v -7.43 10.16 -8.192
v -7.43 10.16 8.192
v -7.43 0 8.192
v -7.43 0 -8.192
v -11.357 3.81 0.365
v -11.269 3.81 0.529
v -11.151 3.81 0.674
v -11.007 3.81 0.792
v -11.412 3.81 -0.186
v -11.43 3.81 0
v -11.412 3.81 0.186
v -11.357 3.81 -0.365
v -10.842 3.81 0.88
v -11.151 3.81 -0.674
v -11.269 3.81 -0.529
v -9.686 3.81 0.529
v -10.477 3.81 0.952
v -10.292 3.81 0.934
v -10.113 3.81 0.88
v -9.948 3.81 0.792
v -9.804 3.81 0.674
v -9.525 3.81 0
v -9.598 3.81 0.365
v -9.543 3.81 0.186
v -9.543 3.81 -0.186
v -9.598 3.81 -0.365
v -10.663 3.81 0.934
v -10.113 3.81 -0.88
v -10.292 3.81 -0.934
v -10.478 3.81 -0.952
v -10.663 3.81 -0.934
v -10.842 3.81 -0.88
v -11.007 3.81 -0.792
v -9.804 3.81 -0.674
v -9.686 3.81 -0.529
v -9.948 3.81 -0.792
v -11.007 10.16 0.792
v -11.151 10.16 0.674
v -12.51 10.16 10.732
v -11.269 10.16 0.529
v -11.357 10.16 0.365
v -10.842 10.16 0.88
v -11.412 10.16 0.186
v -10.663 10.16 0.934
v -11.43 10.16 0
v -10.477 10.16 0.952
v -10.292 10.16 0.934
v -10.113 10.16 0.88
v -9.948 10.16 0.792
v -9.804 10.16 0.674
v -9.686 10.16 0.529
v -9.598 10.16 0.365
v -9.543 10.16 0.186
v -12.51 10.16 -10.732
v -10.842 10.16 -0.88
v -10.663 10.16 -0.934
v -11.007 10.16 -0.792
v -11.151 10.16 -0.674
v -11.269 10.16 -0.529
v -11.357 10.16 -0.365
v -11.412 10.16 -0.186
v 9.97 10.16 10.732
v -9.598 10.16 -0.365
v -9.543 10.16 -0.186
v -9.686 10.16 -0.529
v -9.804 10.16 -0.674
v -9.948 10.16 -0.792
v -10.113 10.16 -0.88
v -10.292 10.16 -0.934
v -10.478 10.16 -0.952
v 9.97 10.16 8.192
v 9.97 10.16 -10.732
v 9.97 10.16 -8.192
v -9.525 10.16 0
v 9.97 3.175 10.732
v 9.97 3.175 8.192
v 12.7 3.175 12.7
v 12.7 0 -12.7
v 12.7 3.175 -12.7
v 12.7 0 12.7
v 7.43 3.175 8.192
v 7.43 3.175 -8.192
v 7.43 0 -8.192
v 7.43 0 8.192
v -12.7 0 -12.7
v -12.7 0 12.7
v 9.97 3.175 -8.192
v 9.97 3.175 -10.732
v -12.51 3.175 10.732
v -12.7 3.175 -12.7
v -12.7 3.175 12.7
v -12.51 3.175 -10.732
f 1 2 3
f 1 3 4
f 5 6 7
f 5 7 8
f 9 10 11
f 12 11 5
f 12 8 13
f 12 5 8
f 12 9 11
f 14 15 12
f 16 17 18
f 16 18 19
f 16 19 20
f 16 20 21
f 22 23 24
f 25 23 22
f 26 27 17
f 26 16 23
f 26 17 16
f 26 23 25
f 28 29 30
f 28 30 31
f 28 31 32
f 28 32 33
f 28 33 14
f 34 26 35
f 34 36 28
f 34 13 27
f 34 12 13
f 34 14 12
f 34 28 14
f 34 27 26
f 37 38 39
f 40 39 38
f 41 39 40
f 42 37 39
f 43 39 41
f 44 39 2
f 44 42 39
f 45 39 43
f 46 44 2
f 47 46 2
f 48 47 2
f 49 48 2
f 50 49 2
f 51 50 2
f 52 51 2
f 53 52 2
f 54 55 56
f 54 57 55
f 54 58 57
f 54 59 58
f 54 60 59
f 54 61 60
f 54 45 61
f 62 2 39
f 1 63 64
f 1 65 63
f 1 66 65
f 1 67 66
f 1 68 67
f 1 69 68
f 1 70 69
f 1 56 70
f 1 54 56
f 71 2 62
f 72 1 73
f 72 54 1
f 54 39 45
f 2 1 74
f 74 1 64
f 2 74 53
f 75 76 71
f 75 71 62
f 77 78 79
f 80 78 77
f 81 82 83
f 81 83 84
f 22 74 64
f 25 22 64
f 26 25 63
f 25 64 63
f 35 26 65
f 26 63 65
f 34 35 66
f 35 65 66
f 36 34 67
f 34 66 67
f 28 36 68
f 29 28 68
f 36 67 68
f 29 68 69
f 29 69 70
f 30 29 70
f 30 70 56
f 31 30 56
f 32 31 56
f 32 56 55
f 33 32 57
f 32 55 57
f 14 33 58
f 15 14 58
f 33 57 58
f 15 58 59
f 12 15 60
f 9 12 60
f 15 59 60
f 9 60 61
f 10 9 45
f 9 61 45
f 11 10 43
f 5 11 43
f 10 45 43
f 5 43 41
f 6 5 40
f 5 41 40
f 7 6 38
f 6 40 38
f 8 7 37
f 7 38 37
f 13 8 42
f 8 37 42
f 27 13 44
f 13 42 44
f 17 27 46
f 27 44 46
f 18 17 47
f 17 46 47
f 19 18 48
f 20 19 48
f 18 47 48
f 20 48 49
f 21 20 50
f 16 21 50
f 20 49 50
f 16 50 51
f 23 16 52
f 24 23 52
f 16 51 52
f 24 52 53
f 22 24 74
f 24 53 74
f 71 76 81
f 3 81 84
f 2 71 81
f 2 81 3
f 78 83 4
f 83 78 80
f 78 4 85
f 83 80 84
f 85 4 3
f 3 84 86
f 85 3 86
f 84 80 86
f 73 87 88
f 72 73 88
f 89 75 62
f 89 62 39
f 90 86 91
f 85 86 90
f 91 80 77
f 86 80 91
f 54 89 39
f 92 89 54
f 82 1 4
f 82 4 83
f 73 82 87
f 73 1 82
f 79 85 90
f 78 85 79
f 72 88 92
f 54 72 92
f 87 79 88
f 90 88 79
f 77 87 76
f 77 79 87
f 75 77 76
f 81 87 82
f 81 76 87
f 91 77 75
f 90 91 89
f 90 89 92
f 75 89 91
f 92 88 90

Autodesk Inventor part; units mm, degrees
ref_plane "YZ Plane" through (0, 0, 0) normal (1, 0, 0) x (0, 1, 0)
ref_plane "XZ Plane" through (0, 0, 0) normal (0, 1, 0) x (-1, 0, 0)
ref_plane "XY Plane" through (0, 0, 0) normal (0, 0, 1) x (1, 0, 0)
sketch "Sketch1" plane through (0, 0, 0) normal (0, 1, 0) x (-1, 0, 0)
  line L0 (-12.7, 12.7) -> (12.7, 12.7)
  line L1 (12.7, 12.7) -> (12.7, -12.7)
  line L2 (12.7, -12.7) -> (-12.7, -12.7)
  line L3 (-12.7, -12.7) -> (-12.7, 12.7)
  line L4 (-12.7, 12.7) -> (12.7, -12.7) construction
  line L5 (12.7, 12.7) -> (-12.7, -12.7) construction
  point P0 (0, 0)
  dimension "d0" = 25.4
  dimension "d1" = 25.4
extrude "Extrusion1" add sketch "Sketch1" along normal blind 3.175
sketch "Sketch2" plane through (0, 3.175, 0) normal (0, 1, 0) x (1, 0, 0)
  line L0 (7.4295, -8.1915) -> (-7.4295, -8.1915)
  line L1 (-7.4295, -8.1915) -> (-7.4295, 8.1915)
  line L2 (-7.4295, 8.1915) -> (7.4295, 8.1915)
  line L3 (7.4295, 8.1915) -> (7.4295, -8.1915)
  line L4 (7.4295, -8.1915) -> (-7.4295, 8.1915) construction
  line L5 (-7.4295, -8.1915) -> (7.4295, 8.1915) construction
  point P0 (0, 0)
  dimension "d4" = 14.859
  dimension "d5" = 16.383
extrude "Extrusion2" cut sketch "Sketch2" against normal through all
sketch "Sketch3" plane through (0, 3.175, 0) normal (0, 1, 0) x (1, 0, 0)
  line L0 (-7.4295, -8.1915) -> (-7.4295, 8.1915) projected
  line L1 (-7.4295, -8.1915) -> (-12.5095, -8.1915)
  line L2 (-12.5095, -8.1915) -> (-12.5095, 8.1915)
  line L3 (-12.5095, 8.1915) -> (-7.4295, 8.1915)
  line L4 (-7.4295, 8.1915) -> (-7.4295, -8.1915)
  line L5 (-12.5095, -8.1915) -> (9.9695, -8.1915)
  line L6 (9.9695, -8.1915) -> (9.9695, -10.7315)
  line L7 (9.9695, -10.7315) -> (-12.5095, -10.7315)
  line L8 (-12.5095, -10.7315) -> (-12.5095, -8.1915)
  line L9 (7.4295, 8.1915) -> (7.4295, -8.1915) projected
  line L10 (-12.5095, 8.1915) -> (9.9695, 8.1915)
  line L11 (9.9695, 8.1915) -> (9.9695, 10.7315)
  line L12 (9.9695, 10.7315) -> (-12.5095, 10.7315)
  line L13 (-12.5095, 10.7315) -> (-12.5095, 8.1915)
  point P0 (0, 0)
  point P1 (-9.9695, 8.1915)
  point P2 (9.9695, -9.4615)
  point P3 (9.9695, 9.4615)
  dimension "d11" = 2.54
  dimension "d12" = 2.54
  dimension "d13" = 2.54
  dimension "d14" = 5.08
extrude "Extrusion3" add sketch "Sketch3" along normal blind 6.985 contours L1 L2 L3 L0 | L5 L6 L7 L8 L1 | L3 L13 L12 L11 L10
sketch "Sketch4" plane through (0, 10.16, 0) normal (0, 1, 0) x (1, 0, 0)
  line L0 (-7.4295, -8.1915) -> (-7.4295, 8.1915) construction
  line L1 (-7.4295, -3.81) -> (-9.7155, -3.81) construction
  line L2 (-9.7155, -3.81) -> (-9.7155, 3.81) construction
  line L3 (-9.7155, 3.81) -> (-7.4295, 3.81) construction
  line L4 (-7.4295, 3.81) -> (-7.4295, -3.81) construction
  circle A0 centre (-10.4775, 0) radius 1.143 construction
  circle A1 centre (-10.4775, 0) radius 0.9525
  point P0 (0, 0)
  point P1 (-7.4295, 0)
  point P2 (-9.7155, 0)
  dimension "d15" = 2.286
  dimension "d16" = 7.62
  dimension "d17" = 2.286
  dimension "d18" = 1.905
  dimension "d21" = 0.762
extrude "Extrusion4" cut sketch "Sketch4" against normal blind 6.35
properties part number "RJ45Insert"
